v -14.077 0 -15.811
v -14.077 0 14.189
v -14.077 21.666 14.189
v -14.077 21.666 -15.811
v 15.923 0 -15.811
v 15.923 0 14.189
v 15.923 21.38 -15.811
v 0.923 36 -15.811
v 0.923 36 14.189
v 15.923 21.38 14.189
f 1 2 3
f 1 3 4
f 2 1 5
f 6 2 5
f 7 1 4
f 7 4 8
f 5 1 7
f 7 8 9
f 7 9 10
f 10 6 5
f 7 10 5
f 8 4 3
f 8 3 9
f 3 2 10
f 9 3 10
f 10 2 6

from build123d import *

# Parameters (mm, degrees)
SKETCH_1_W          = 30
SKETCH_1_H          = 30
EXTRUDE_1_DEPTH     = 36
CUT_EXTRUDE_START   = -15.811192309
CUT_EXTRUDE_9_DEPTH = 30


# Read off the part's stored shape, not the designer's step: 切除-拉伸9
with BuildPart() as part:
    # 草图1 → 凸台-拉伸1 (new body)
    with BuildSketch(Plane(origin=(0, 0, 0), x_dir=(1, 0, 0), z_dir=(0, 1, 0))):
        with Locations((0.922994888, 0.811192309)):
            Rectangle(SKETCH_1_W, SKETCH_1_H)
    extrude(amount=EXTRUDE_1_DEPTH)

    # 切除-拉伸9 outline → 切除-拉伸9 (cut)
    with BuildSketch(Plane.XY.offset(CUT_EXTRUDE_START)):
        Polygon((-14.077005112, 36), (-14.077005112, 21.665729015), (0.922994888, 36), align=None)
        Polygon((15.922994888, 36), (0.922994888, 36), (15.922994888, 21.379503866), align=None)
    extrude(amount=CUT_EXTRUDE_9_DEPTH, mode=Mode.SUBTRACT)


solid = part.part
